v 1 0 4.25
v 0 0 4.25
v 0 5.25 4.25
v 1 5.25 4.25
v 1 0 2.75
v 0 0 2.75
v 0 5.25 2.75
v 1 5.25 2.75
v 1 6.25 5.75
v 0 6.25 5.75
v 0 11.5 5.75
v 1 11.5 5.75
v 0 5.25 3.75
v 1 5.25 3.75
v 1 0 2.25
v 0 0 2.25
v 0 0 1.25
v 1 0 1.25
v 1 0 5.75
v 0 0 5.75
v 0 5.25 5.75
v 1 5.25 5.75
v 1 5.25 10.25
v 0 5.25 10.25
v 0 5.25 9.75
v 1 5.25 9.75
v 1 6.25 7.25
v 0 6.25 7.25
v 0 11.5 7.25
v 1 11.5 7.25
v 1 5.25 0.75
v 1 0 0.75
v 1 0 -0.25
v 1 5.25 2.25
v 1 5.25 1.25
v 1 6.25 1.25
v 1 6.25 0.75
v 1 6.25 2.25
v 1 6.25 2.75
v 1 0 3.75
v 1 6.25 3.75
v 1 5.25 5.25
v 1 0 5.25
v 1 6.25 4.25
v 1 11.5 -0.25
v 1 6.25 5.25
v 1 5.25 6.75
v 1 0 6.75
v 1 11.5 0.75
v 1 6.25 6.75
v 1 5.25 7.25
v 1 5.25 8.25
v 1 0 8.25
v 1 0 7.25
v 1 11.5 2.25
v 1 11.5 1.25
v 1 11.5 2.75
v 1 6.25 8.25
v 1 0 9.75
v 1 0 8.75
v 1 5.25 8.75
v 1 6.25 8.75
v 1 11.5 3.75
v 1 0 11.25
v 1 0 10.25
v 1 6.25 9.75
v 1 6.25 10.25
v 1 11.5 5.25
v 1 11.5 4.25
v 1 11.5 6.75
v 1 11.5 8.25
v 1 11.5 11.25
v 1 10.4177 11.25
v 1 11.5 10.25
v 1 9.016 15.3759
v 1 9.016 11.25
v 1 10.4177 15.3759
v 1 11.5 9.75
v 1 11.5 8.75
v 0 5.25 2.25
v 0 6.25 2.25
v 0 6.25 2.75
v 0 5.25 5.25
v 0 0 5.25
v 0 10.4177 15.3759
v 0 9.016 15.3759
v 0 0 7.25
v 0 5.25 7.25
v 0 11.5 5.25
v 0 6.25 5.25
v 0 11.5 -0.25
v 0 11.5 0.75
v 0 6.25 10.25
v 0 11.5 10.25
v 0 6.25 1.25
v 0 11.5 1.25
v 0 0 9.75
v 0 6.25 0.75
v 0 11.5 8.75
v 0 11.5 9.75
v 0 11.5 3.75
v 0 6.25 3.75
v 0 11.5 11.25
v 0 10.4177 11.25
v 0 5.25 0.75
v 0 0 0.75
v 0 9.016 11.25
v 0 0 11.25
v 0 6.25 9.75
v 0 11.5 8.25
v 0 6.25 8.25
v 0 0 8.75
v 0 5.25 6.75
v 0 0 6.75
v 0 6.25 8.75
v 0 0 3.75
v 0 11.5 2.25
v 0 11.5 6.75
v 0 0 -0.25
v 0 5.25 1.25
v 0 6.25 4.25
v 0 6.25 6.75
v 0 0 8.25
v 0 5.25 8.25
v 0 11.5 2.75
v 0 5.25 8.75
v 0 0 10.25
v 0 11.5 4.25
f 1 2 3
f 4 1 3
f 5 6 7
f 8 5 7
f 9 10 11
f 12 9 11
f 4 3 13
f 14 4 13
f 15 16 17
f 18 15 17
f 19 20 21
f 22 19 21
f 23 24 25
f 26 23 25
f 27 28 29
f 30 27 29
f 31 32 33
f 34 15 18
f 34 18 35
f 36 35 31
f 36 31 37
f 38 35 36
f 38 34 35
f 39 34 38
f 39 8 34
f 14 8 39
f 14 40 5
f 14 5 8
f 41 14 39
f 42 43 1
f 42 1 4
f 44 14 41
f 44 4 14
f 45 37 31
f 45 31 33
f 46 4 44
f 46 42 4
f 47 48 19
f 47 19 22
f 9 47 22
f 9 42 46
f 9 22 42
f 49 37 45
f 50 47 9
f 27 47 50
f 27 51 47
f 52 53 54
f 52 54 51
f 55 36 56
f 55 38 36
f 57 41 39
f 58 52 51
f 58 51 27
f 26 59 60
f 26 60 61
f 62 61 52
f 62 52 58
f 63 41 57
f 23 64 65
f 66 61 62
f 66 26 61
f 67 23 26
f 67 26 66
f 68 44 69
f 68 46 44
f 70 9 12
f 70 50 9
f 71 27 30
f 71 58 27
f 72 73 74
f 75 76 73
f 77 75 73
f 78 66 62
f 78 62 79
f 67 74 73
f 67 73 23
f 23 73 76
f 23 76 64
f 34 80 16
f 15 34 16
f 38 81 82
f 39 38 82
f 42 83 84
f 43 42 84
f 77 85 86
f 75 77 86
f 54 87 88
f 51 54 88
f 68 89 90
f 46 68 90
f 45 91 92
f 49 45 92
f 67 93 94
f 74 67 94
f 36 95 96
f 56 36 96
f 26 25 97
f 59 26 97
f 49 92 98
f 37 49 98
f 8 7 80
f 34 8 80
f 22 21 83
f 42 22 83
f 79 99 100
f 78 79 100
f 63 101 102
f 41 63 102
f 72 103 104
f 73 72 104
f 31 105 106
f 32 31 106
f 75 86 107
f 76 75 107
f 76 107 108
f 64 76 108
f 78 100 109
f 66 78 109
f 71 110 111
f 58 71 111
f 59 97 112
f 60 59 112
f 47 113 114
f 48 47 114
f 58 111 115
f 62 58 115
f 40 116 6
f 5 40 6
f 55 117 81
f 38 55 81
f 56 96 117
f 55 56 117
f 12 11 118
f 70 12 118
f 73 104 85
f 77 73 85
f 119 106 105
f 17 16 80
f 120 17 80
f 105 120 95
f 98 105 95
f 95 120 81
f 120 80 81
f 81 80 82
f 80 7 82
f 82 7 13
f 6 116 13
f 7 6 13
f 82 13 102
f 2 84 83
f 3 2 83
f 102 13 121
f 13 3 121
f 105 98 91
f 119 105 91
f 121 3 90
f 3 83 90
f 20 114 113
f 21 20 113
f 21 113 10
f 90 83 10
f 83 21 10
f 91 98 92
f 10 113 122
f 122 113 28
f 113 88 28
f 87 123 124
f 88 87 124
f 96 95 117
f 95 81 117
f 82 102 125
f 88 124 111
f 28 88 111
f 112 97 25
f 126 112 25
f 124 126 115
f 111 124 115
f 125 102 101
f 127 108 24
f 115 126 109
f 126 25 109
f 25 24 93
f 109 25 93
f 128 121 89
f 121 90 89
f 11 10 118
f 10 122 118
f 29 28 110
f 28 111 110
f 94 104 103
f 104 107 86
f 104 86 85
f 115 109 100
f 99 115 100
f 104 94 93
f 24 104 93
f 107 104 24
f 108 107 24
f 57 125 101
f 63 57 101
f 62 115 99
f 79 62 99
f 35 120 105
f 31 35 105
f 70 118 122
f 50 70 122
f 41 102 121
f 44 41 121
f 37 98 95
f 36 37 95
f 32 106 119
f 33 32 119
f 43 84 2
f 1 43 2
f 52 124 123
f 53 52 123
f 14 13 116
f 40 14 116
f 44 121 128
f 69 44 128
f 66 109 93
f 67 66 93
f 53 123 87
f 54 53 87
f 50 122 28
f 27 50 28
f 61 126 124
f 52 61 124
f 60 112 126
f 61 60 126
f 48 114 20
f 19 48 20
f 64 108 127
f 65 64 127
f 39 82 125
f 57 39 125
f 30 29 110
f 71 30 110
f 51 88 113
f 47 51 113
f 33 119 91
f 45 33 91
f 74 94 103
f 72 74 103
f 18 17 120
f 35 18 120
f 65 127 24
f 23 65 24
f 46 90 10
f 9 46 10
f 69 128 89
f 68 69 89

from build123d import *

# Parameters (mm, degrees)
F1_DEPTH = 1


# Not quite as in the source:
# - a feature names something its author has since deleted; it is built from what else it names


with BuildPart() as f1:
    # F0 (on Right) → F1 (new body)
    with BuildSketch(Plane.YZ):
        Polygon((0, 0.75), (0, 0), (0, -0.25), (11.5, -0.25), (11.5, 0), (11.5, 0.75), (11.25, 0.75), (6.25, 0.75), (6.25, 1.25), (11.25, 1.25), (11.5, 1.25), (11.5, 2.25), (11.25, 2.25), (6.25, 2.25), (6.25, 2.75), (11.25, 2.75), (11.5, 2.75), (11.5, 3.75), (11.25, 3.75), (6.25, 3.75), (6.25, 4.25), (11.25, 4.25), (11.5, 4.25), (11.5, 5.25), (11.25, 5.25), (6.25, 5.25), (6.25, 5.75), (11.25, 5.75), (11.5, 5.75), (11.5, 6.75), (11.25, 6.75), (6.25, 6.75), (6.25, 7.25), (11.25, 7.25), (11.5, 7.25), (11.5, 8.25), (11.25, 8.25), (6.25, 8.25), (6.25, 8.75), (11.25, 8.75), (11.5, 8.75), (11.5, 9.75), (11.25, 9.75), (6.25, 9.75), (6.25, 10.25), (11.25, 10.25), (11.5, 10.25), (11.5, 11.25), (10.4177193716, 11.25), (10.4177193716, 15.3758693486), (9.0160202235, 15.3758693486), (9.0160202235, 11.25), (0, 11.25), (0, 10.25), (0.25, 10.25), (5.25, 10.25), (5.25, 9.75), (0.25, 9.75), (0, 9.75), (0, 8.75), (0.25, 8.75), (5.25, 8.75), (5.25, 8.25), (0.25, 8.25), (0, 8.25), (0, 7.25), (0.25, 7.25), (5.25, 7.25), (5.25, 6.75), (0.25, 6.75), (0, 6.75), (0, 5.75), (0.25, 5.75), (5.25, 5.75), (5.25, 5.25), (0.25, 5.25), (0, 5.25), (0, 4.25), (0.25, 4.25), (5.25, 4.25), (5.25, 3.75), (0.25, 3.75), (0, 3.75), (0, 2.75), (0.25, 2.75), (5.25, 2.75), (5.25, 2.25), (0.25, 2.25), (0, 2.25), (0, 1.25), (0.25, 1.25), (5.25, 1.25), (5.25, 0.75), (0.25, 0.75), align=None)
    extrude(amount=F1_DEPTH)


solid = f1.part
